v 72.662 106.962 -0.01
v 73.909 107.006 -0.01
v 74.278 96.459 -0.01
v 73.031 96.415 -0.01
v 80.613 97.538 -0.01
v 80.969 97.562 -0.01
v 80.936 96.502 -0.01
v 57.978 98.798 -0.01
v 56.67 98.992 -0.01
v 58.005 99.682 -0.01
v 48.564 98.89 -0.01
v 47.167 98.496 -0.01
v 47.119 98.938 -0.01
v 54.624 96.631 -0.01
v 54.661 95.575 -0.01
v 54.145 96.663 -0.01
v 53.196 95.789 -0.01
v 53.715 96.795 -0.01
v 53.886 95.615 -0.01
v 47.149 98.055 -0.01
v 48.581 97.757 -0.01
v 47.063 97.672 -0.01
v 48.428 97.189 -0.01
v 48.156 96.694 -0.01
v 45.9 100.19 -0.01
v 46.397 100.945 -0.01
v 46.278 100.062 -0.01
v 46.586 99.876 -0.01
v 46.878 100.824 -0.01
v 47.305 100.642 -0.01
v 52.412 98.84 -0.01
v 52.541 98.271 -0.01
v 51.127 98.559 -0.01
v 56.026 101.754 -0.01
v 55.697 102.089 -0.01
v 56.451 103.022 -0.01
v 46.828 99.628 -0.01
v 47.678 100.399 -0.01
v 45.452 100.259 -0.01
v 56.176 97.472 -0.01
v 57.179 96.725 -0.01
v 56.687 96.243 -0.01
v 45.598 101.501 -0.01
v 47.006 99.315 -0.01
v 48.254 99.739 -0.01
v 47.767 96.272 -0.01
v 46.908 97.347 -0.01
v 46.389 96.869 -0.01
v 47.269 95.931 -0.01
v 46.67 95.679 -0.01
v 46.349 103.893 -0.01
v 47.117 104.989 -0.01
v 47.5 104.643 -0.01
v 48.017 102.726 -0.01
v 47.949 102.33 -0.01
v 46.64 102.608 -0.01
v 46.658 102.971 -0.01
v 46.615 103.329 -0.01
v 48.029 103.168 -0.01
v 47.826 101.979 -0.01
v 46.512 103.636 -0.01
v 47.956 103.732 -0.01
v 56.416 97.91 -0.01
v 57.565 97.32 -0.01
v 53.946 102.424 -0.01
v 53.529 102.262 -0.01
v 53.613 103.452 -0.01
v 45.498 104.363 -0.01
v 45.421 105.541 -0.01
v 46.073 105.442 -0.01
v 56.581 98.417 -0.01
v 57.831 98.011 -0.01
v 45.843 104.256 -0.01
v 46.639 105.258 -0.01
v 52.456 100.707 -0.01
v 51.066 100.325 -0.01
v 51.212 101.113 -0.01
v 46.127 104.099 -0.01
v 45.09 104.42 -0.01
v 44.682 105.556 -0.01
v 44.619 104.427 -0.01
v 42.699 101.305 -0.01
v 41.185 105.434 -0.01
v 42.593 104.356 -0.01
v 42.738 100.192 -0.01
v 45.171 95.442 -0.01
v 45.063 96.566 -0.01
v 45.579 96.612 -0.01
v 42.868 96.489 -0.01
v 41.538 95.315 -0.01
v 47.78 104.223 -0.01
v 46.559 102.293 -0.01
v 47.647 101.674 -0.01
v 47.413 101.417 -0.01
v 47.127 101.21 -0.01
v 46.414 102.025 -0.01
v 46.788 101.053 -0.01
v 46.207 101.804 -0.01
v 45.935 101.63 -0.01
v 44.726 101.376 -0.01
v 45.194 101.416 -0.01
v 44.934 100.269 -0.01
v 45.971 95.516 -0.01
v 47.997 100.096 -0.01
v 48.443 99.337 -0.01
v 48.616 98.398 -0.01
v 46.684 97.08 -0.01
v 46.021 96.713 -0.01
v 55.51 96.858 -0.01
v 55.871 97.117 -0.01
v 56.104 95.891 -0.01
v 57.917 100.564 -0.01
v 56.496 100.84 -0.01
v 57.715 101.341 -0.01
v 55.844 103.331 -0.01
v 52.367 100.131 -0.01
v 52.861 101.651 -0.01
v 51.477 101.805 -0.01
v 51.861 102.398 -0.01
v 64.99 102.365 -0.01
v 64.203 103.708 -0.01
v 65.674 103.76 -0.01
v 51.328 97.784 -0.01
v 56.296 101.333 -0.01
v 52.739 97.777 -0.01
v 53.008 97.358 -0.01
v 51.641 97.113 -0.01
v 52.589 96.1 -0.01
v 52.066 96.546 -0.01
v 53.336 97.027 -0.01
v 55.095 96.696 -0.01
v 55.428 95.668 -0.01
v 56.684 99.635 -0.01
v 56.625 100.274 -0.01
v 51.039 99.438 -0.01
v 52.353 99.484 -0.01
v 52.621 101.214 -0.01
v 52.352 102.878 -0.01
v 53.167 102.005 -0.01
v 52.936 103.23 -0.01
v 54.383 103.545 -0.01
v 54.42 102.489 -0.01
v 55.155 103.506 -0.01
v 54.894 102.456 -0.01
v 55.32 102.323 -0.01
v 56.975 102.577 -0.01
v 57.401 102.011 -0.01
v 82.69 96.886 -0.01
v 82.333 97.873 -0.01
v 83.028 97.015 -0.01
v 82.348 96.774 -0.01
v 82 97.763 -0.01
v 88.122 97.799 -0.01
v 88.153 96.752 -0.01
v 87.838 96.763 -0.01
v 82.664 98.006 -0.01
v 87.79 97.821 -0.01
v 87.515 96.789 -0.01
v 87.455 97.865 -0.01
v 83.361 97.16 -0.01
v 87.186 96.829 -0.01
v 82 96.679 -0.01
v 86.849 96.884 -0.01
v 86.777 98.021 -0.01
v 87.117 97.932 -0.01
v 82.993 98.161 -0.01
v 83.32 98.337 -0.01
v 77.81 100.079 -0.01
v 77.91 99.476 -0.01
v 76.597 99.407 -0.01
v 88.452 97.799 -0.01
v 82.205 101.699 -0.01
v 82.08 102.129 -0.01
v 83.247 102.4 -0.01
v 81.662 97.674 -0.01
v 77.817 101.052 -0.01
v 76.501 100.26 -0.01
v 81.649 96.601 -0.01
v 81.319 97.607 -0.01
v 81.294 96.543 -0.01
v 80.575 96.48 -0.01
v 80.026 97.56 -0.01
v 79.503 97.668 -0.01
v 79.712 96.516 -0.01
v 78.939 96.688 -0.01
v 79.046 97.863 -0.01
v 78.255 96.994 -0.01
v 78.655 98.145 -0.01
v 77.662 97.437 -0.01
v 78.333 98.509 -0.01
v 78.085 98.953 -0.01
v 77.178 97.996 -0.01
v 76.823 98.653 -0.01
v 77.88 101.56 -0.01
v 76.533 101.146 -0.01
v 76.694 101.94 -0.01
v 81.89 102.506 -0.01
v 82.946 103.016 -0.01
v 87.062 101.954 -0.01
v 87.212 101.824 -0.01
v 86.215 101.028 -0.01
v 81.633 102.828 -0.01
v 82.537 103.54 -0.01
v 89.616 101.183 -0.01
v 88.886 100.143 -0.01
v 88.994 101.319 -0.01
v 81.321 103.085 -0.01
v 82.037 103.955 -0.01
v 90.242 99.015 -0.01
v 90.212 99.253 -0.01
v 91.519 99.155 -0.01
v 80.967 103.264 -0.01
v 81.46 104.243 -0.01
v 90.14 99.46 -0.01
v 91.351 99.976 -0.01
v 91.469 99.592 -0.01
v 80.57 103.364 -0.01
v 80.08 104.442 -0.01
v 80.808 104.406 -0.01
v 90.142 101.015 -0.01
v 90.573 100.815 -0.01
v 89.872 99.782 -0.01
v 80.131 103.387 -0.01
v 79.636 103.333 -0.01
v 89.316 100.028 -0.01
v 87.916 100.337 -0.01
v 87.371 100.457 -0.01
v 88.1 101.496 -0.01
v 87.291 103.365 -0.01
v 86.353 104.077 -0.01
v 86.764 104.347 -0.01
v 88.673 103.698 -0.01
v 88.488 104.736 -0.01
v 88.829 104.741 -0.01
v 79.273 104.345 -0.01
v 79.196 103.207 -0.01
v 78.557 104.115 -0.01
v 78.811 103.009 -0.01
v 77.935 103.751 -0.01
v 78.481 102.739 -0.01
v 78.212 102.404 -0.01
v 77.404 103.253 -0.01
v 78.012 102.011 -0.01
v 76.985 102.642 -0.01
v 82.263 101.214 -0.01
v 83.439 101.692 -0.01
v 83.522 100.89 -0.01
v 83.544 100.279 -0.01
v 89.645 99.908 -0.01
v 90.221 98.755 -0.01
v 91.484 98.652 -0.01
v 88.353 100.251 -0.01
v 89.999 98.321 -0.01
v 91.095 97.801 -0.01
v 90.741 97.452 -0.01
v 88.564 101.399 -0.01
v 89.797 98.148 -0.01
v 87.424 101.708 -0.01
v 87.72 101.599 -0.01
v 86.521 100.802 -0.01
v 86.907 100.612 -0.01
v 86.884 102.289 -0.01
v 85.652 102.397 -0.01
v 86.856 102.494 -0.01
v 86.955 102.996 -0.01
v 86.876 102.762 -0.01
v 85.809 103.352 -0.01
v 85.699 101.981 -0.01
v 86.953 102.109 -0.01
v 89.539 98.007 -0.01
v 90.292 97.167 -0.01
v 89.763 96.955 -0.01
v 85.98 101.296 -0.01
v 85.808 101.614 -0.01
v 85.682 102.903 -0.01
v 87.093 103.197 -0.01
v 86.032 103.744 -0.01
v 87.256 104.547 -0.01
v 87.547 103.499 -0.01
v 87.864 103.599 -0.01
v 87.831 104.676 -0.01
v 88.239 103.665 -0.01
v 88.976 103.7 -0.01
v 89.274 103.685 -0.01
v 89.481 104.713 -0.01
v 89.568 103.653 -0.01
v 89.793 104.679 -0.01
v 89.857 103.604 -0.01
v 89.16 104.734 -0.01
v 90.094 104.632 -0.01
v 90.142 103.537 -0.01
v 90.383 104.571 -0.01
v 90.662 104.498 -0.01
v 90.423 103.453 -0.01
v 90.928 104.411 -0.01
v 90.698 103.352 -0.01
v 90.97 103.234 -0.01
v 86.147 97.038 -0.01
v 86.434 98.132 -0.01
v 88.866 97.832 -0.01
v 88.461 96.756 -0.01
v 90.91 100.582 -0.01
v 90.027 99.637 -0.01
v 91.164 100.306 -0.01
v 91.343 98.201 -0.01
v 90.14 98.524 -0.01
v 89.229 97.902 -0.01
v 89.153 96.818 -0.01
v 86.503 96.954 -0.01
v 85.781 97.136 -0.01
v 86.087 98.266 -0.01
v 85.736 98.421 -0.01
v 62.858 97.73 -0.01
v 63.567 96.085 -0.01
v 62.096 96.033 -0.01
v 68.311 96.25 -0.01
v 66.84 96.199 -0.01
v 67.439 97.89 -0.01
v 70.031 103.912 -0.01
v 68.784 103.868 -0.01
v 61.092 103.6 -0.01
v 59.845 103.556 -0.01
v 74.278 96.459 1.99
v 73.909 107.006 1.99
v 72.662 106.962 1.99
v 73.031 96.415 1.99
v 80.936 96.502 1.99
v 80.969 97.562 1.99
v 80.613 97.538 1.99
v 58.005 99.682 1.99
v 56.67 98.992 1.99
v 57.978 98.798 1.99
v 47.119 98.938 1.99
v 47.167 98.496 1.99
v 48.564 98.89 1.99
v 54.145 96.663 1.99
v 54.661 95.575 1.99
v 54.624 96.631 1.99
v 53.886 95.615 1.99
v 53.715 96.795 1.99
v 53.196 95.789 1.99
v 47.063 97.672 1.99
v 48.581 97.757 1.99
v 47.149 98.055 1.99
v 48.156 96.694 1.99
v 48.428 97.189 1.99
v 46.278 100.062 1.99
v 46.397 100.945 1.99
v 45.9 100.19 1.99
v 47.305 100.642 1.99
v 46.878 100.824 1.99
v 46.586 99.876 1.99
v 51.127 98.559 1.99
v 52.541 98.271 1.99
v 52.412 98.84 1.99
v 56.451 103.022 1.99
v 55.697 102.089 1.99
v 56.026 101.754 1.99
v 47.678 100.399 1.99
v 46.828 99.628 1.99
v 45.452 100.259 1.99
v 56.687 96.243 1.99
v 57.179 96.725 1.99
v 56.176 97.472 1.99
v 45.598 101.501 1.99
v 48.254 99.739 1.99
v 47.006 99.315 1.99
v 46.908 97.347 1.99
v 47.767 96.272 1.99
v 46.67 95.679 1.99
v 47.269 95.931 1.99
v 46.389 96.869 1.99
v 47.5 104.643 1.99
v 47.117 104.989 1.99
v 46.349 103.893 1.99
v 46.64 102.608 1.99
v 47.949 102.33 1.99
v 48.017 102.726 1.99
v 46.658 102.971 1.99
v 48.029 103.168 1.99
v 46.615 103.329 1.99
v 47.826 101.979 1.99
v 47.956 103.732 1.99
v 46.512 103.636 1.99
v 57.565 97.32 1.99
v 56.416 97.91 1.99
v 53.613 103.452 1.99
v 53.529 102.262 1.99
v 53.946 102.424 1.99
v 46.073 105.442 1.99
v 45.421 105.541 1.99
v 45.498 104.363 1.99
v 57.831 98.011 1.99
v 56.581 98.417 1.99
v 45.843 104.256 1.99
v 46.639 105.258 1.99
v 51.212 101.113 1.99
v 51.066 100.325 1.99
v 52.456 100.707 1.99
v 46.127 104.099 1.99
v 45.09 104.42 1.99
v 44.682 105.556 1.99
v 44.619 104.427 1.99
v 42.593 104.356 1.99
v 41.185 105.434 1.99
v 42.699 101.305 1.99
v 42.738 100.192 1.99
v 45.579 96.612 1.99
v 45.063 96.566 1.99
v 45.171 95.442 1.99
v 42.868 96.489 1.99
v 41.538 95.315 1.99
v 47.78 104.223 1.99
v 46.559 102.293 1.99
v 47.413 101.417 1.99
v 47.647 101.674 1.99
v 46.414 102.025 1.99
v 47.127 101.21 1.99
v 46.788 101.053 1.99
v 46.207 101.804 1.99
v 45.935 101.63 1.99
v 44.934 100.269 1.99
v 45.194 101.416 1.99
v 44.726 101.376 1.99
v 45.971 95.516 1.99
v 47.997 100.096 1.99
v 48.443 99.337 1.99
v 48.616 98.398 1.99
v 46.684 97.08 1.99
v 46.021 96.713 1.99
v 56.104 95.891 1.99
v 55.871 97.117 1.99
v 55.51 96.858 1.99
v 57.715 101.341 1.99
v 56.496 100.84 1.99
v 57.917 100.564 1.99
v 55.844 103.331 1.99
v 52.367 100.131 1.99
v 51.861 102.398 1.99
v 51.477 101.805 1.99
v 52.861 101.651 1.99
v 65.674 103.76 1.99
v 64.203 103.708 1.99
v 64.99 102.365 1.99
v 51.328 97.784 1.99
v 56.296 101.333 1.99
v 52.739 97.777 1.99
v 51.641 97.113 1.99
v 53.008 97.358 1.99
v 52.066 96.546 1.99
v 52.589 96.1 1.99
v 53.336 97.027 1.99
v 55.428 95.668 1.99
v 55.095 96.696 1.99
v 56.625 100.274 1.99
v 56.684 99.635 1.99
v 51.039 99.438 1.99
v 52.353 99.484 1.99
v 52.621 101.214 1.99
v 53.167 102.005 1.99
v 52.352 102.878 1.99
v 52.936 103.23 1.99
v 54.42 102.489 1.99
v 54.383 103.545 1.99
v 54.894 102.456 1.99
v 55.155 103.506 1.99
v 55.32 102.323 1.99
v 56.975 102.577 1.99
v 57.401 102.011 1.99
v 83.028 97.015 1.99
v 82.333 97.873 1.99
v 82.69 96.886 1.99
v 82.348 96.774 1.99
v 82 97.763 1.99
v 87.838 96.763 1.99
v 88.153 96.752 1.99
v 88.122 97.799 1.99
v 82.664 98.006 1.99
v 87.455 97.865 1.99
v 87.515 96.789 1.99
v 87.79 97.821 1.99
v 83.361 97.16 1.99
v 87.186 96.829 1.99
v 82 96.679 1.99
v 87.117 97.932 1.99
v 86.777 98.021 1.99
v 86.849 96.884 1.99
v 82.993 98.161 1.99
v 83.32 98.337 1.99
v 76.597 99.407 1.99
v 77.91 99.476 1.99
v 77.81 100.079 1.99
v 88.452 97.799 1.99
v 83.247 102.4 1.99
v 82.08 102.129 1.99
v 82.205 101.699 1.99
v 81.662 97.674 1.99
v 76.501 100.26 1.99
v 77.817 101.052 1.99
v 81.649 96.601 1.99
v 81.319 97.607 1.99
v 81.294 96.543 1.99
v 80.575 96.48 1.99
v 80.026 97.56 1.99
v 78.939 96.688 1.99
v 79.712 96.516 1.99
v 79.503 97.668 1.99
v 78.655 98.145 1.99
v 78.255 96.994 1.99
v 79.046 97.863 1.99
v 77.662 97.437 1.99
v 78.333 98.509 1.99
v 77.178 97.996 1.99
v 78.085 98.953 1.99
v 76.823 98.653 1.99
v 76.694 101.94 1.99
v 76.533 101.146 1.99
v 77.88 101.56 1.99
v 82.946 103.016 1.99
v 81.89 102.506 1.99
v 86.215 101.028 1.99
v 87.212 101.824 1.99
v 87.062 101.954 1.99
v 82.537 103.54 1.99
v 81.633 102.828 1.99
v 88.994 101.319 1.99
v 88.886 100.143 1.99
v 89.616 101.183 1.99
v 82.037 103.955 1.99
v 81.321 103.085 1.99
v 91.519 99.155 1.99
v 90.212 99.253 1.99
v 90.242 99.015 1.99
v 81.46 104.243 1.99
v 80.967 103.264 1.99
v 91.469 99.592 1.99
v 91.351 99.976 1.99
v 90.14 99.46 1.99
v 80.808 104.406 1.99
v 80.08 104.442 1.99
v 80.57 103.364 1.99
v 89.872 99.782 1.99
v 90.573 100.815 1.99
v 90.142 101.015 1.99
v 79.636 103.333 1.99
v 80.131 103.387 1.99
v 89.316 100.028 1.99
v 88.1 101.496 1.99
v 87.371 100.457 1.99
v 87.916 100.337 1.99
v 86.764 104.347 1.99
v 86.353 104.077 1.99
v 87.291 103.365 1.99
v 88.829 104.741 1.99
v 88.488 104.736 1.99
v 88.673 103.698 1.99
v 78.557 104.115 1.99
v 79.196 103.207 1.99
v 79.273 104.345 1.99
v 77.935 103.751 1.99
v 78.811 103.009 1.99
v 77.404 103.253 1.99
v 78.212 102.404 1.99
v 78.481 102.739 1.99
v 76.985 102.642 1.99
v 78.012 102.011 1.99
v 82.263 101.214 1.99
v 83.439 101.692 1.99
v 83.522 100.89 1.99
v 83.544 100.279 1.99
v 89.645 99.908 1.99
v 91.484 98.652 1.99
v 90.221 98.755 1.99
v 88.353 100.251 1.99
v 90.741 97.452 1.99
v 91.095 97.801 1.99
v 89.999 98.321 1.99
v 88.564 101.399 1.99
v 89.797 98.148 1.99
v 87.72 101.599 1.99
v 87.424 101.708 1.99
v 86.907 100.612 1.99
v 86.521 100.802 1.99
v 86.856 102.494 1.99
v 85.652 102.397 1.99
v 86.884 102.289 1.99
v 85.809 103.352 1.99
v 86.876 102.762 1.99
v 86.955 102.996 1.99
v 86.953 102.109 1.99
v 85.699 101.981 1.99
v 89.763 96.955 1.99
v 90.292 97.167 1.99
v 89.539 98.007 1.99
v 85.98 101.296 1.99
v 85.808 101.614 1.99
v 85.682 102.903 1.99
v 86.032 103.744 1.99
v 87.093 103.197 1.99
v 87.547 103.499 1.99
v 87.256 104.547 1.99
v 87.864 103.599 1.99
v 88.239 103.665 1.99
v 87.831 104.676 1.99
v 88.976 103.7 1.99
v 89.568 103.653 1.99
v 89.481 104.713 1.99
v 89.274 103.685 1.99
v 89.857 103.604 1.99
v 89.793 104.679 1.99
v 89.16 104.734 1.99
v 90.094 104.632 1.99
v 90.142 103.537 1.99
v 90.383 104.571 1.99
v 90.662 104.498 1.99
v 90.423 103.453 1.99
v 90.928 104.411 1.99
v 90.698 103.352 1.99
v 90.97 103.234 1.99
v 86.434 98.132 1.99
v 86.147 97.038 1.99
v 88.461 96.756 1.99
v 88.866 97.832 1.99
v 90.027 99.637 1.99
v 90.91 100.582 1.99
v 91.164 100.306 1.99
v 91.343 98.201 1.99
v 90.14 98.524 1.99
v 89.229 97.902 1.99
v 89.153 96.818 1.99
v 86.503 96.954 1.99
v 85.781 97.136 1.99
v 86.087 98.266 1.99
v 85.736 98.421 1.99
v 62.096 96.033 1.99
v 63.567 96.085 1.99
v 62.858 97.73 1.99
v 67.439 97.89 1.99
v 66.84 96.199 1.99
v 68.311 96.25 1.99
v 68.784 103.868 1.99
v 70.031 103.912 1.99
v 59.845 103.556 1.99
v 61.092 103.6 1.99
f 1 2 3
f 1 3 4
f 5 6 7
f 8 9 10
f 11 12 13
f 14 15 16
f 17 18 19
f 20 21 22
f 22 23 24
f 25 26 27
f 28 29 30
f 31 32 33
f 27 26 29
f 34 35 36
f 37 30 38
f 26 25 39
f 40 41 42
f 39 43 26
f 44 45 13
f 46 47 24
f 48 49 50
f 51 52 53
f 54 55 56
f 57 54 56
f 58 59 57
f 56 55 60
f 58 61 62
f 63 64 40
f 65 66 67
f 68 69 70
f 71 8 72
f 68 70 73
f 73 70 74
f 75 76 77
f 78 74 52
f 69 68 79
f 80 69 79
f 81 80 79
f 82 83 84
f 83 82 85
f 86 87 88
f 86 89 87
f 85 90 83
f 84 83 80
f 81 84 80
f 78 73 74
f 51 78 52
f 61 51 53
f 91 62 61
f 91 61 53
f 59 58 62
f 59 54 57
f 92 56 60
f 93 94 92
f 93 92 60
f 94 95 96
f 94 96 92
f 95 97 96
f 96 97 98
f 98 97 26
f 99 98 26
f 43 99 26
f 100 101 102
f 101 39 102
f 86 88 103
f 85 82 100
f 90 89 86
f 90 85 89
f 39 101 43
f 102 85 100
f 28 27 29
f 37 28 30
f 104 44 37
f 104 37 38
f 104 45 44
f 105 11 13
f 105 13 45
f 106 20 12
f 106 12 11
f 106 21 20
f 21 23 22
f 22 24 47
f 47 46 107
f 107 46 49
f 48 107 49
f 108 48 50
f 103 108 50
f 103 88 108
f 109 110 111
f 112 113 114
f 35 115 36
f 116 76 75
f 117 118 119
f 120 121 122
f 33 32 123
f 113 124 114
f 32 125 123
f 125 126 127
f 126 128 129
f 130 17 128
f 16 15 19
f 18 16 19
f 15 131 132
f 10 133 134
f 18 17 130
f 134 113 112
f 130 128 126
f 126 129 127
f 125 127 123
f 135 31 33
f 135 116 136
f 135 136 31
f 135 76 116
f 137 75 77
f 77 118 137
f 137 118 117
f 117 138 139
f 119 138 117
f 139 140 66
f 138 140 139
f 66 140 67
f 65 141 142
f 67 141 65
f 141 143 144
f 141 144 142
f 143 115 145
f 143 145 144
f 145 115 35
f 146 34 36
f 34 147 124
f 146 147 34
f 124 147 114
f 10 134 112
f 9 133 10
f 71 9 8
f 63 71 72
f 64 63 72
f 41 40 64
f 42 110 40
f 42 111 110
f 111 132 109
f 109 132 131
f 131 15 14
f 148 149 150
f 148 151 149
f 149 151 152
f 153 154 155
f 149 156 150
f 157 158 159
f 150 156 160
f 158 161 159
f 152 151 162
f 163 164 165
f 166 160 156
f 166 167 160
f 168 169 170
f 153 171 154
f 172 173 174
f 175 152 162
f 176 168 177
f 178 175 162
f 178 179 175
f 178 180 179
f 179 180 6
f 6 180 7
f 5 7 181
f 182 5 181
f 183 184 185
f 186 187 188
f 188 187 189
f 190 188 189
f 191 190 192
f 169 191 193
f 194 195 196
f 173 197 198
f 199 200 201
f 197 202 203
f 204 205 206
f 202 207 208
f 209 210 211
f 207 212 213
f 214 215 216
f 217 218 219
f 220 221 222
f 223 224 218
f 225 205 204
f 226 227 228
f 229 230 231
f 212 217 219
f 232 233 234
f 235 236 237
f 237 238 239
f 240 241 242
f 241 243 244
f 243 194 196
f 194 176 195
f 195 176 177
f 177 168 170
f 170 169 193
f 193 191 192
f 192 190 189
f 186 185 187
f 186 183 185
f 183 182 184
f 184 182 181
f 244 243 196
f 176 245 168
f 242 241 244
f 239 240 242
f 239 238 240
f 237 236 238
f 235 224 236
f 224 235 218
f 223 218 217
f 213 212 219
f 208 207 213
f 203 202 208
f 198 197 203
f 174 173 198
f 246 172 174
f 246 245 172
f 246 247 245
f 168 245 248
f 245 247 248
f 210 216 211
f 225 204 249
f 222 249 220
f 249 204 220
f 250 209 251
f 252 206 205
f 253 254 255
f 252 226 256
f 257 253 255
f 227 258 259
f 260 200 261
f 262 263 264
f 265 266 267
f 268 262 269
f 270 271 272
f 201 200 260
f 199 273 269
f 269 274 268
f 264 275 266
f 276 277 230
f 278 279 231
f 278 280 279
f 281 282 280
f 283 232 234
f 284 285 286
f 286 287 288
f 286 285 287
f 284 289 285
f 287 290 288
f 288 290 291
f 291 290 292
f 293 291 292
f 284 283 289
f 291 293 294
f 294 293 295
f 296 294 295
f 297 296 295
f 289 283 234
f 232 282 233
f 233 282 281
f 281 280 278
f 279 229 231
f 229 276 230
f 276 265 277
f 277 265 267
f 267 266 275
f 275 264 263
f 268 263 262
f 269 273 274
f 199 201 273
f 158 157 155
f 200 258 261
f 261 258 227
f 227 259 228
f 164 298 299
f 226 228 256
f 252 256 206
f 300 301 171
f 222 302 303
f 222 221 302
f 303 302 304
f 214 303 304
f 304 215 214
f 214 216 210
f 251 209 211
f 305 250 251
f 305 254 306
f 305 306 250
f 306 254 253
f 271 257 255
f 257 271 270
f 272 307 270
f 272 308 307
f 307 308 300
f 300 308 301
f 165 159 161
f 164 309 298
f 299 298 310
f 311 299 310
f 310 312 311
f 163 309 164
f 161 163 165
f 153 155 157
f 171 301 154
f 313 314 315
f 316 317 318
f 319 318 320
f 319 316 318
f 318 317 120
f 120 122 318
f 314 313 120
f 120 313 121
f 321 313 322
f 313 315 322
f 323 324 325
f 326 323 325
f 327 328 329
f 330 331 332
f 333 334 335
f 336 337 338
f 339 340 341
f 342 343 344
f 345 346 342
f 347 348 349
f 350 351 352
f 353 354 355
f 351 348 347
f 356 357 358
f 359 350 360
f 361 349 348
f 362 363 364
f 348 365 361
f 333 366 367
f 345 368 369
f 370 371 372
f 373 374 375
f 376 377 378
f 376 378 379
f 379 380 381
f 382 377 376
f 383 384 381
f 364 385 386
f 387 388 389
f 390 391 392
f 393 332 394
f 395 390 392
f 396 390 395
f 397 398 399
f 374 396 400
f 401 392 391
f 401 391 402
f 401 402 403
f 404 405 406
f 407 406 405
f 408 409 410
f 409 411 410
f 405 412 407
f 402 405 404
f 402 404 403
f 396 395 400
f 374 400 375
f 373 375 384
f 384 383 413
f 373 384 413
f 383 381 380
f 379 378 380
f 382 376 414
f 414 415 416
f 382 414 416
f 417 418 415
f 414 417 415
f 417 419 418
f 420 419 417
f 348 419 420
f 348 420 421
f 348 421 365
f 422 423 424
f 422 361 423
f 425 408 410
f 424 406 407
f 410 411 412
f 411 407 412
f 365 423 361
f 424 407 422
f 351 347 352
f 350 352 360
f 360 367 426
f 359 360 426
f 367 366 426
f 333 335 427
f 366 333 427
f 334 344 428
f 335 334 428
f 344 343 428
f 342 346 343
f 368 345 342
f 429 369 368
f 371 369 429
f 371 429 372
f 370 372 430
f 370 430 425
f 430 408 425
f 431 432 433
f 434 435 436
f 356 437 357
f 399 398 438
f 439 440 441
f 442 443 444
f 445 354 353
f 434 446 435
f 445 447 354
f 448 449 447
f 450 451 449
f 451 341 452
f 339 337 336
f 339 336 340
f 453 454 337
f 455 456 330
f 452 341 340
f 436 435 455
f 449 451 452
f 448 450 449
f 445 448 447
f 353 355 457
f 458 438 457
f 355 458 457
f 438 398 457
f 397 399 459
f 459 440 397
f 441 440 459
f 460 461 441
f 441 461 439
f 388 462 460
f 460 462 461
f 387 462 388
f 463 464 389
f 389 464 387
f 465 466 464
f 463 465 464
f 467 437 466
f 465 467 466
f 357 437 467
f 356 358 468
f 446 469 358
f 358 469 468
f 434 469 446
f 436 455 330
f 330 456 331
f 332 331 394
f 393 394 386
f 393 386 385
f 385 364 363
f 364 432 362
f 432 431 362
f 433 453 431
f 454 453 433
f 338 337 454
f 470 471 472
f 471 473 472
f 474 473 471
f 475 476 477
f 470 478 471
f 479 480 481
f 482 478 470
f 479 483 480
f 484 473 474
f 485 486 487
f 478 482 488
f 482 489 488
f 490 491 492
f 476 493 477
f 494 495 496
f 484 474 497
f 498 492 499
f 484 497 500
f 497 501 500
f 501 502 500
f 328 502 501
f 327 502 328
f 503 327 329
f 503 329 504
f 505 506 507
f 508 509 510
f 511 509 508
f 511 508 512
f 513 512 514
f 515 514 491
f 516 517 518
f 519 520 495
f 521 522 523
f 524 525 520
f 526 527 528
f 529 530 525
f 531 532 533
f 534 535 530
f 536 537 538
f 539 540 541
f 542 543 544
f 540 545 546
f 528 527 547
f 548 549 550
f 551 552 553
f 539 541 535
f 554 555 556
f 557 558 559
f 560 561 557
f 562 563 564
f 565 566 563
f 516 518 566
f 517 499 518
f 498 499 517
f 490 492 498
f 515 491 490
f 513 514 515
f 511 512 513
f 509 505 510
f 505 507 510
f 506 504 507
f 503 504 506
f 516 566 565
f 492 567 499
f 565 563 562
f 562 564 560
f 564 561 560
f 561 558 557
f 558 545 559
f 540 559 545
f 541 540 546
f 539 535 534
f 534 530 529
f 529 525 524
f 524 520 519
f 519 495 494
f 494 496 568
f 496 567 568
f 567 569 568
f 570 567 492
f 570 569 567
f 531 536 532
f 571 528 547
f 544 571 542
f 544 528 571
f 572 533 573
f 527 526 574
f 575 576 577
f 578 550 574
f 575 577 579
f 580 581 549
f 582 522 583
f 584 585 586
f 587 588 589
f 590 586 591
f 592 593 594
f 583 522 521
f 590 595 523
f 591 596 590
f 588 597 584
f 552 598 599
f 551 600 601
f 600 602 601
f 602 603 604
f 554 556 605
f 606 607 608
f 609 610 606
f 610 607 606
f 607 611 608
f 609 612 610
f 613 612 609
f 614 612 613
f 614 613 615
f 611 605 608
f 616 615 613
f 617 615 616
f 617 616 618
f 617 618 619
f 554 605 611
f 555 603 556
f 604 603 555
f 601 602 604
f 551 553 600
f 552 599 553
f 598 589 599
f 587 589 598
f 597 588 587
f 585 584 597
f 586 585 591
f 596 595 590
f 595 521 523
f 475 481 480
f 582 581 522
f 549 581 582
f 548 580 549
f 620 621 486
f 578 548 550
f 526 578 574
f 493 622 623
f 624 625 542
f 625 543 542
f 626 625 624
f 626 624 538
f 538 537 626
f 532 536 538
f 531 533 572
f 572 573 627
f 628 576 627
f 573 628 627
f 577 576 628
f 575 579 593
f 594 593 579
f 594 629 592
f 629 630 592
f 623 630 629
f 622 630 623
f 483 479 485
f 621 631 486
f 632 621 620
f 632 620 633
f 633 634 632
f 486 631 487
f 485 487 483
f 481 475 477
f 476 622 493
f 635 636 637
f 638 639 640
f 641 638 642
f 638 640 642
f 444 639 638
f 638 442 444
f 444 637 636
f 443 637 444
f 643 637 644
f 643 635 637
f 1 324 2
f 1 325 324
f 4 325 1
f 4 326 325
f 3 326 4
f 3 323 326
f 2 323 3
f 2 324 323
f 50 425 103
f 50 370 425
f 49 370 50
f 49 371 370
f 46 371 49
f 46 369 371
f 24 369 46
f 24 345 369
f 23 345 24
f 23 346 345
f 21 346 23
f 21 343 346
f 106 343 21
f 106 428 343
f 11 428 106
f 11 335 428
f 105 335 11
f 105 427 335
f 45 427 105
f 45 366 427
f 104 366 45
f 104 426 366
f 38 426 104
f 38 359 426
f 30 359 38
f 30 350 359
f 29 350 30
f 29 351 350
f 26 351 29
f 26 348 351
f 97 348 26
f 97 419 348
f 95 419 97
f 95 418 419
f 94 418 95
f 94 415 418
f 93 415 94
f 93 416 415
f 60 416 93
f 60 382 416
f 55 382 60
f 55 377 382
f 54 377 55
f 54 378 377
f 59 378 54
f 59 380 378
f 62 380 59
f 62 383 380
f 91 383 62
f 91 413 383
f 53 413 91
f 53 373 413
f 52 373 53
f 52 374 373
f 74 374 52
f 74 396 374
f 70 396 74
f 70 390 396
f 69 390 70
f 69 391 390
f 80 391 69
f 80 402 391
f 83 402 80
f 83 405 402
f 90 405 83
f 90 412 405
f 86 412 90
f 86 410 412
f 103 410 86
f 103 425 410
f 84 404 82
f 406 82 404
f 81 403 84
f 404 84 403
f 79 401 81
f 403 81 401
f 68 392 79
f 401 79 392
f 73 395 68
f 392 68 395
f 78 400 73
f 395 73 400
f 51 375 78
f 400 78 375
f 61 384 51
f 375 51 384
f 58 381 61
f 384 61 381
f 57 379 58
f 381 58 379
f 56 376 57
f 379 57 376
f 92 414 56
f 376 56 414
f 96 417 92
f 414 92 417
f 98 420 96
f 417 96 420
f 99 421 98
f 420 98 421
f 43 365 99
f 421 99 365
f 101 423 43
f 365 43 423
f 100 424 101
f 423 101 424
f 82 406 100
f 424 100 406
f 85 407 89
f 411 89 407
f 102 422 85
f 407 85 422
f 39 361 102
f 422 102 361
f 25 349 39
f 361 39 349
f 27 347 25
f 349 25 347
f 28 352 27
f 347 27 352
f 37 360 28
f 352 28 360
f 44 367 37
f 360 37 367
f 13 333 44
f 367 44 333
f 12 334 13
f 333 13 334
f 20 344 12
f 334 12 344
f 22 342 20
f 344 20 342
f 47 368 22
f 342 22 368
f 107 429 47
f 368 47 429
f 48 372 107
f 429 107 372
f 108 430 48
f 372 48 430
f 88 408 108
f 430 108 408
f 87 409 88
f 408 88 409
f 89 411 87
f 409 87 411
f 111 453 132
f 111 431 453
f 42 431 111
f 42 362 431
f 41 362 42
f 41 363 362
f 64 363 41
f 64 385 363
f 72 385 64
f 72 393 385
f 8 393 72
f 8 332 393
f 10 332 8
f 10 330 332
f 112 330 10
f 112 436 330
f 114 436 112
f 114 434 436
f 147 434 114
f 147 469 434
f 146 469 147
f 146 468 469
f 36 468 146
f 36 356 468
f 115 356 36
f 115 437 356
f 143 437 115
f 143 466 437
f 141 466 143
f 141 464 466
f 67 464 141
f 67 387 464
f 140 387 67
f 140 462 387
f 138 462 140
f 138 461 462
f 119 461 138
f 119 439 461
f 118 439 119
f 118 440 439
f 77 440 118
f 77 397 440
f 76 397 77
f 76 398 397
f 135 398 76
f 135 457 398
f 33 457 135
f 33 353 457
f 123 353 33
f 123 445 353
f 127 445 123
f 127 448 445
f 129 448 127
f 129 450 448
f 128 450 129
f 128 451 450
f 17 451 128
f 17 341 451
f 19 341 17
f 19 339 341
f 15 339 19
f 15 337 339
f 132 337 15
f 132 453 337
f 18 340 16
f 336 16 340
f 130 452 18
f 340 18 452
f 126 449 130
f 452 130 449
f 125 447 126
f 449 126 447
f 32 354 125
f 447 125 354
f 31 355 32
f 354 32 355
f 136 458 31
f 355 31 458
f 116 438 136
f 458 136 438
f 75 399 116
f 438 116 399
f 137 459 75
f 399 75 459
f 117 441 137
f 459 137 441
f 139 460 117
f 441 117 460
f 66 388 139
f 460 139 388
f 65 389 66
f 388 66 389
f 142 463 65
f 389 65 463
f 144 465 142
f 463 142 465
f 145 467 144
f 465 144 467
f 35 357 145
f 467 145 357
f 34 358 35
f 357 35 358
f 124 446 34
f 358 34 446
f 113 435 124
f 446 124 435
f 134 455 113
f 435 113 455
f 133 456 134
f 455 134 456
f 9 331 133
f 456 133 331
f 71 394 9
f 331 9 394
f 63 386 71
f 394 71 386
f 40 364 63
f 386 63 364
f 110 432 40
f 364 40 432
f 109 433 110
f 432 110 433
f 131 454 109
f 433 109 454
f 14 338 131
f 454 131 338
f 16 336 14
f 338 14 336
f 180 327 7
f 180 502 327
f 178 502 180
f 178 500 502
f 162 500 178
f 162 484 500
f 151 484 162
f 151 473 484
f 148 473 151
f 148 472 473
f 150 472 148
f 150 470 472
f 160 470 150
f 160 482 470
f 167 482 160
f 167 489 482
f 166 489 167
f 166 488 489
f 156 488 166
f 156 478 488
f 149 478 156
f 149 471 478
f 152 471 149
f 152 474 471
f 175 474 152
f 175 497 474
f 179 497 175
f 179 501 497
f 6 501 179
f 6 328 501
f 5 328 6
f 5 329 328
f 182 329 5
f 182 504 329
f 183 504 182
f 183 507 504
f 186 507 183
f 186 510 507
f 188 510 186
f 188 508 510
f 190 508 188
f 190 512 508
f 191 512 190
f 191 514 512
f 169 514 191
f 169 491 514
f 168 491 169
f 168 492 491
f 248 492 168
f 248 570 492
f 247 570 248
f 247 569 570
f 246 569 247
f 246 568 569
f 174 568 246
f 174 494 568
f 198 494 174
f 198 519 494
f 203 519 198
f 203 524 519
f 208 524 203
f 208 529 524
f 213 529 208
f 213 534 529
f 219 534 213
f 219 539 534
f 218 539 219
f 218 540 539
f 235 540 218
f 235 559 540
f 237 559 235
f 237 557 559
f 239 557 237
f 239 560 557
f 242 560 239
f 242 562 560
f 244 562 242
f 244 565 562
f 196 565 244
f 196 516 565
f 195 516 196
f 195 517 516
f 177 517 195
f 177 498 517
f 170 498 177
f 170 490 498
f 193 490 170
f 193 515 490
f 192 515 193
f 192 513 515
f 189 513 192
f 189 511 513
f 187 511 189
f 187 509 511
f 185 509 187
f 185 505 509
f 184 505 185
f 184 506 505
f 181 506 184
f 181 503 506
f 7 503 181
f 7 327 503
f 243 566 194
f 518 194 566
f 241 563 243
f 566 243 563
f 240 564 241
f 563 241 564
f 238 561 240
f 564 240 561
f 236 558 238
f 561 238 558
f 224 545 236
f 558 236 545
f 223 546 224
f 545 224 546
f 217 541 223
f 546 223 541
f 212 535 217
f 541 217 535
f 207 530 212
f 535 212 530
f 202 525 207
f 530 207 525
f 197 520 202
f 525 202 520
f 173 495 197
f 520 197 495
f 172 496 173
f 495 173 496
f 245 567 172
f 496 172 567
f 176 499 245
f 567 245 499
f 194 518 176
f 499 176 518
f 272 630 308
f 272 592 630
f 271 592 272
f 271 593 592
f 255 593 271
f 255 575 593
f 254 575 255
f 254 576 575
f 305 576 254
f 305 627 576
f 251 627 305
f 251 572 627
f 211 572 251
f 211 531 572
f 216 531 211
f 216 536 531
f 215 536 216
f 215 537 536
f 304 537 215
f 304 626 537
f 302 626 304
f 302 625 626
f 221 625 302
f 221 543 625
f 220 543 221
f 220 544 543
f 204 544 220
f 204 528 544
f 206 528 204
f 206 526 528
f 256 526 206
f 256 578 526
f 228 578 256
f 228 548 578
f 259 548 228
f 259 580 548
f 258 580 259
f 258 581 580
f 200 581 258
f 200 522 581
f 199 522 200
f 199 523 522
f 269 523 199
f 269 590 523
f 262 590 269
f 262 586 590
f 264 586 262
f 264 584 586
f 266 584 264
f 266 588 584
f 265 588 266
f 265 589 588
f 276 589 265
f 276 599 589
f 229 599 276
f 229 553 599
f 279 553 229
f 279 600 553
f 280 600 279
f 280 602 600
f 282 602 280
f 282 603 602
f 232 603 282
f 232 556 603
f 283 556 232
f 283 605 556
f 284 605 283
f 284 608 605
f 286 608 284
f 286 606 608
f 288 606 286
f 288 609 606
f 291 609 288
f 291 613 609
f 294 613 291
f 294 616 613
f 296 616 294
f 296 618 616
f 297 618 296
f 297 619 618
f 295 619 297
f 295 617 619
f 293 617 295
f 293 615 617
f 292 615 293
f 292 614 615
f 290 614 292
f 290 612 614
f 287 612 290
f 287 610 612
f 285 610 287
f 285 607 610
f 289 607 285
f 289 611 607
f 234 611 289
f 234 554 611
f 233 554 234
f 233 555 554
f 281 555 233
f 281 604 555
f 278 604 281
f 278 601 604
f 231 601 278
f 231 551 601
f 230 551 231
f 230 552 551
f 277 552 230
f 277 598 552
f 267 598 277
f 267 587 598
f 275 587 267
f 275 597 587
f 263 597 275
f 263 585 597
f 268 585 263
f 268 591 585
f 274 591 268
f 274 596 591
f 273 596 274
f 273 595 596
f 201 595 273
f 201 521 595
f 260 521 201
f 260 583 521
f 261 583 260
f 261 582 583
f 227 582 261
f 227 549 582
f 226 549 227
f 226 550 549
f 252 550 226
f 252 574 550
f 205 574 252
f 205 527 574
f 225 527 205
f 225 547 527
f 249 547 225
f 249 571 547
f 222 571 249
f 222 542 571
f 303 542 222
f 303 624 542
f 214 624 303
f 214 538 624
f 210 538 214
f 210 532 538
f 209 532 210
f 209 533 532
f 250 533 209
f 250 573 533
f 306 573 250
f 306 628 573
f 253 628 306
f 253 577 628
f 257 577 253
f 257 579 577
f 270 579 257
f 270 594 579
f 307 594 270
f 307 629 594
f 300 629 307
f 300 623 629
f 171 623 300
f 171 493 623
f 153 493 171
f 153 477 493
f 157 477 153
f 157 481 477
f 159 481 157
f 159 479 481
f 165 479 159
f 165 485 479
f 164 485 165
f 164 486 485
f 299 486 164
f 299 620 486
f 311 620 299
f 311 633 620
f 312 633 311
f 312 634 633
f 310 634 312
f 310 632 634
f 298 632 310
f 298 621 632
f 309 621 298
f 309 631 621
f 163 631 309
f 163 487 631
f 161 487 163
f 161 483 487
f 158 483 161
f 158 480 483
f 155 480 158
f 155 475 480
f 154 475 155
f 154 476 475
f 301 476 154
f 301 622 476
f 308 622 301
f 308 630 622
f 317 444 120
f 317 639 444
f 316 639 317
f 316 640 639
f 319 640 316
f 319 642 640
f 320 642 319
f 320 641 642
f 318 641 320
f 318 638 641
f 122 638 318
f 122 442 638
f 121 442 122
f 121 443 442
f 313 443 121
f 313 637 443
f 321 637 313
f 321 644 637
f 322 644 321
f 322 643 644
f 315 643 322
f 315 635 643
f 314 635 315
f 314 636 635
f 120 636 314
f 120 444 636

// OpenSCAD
difference() {
//union() {
  *import("Reindeer_card_kit/files/reindeer_card_thin_frame.stl");
  translate([21.315,35.24]) translate([45,66,-.01]) rotate([0,0,2]) linear_extrude(2,convexity=3) offset(0) text("Bowles",spacing=1.1,font="Stencil Std",valign="center",halign="center");
}
